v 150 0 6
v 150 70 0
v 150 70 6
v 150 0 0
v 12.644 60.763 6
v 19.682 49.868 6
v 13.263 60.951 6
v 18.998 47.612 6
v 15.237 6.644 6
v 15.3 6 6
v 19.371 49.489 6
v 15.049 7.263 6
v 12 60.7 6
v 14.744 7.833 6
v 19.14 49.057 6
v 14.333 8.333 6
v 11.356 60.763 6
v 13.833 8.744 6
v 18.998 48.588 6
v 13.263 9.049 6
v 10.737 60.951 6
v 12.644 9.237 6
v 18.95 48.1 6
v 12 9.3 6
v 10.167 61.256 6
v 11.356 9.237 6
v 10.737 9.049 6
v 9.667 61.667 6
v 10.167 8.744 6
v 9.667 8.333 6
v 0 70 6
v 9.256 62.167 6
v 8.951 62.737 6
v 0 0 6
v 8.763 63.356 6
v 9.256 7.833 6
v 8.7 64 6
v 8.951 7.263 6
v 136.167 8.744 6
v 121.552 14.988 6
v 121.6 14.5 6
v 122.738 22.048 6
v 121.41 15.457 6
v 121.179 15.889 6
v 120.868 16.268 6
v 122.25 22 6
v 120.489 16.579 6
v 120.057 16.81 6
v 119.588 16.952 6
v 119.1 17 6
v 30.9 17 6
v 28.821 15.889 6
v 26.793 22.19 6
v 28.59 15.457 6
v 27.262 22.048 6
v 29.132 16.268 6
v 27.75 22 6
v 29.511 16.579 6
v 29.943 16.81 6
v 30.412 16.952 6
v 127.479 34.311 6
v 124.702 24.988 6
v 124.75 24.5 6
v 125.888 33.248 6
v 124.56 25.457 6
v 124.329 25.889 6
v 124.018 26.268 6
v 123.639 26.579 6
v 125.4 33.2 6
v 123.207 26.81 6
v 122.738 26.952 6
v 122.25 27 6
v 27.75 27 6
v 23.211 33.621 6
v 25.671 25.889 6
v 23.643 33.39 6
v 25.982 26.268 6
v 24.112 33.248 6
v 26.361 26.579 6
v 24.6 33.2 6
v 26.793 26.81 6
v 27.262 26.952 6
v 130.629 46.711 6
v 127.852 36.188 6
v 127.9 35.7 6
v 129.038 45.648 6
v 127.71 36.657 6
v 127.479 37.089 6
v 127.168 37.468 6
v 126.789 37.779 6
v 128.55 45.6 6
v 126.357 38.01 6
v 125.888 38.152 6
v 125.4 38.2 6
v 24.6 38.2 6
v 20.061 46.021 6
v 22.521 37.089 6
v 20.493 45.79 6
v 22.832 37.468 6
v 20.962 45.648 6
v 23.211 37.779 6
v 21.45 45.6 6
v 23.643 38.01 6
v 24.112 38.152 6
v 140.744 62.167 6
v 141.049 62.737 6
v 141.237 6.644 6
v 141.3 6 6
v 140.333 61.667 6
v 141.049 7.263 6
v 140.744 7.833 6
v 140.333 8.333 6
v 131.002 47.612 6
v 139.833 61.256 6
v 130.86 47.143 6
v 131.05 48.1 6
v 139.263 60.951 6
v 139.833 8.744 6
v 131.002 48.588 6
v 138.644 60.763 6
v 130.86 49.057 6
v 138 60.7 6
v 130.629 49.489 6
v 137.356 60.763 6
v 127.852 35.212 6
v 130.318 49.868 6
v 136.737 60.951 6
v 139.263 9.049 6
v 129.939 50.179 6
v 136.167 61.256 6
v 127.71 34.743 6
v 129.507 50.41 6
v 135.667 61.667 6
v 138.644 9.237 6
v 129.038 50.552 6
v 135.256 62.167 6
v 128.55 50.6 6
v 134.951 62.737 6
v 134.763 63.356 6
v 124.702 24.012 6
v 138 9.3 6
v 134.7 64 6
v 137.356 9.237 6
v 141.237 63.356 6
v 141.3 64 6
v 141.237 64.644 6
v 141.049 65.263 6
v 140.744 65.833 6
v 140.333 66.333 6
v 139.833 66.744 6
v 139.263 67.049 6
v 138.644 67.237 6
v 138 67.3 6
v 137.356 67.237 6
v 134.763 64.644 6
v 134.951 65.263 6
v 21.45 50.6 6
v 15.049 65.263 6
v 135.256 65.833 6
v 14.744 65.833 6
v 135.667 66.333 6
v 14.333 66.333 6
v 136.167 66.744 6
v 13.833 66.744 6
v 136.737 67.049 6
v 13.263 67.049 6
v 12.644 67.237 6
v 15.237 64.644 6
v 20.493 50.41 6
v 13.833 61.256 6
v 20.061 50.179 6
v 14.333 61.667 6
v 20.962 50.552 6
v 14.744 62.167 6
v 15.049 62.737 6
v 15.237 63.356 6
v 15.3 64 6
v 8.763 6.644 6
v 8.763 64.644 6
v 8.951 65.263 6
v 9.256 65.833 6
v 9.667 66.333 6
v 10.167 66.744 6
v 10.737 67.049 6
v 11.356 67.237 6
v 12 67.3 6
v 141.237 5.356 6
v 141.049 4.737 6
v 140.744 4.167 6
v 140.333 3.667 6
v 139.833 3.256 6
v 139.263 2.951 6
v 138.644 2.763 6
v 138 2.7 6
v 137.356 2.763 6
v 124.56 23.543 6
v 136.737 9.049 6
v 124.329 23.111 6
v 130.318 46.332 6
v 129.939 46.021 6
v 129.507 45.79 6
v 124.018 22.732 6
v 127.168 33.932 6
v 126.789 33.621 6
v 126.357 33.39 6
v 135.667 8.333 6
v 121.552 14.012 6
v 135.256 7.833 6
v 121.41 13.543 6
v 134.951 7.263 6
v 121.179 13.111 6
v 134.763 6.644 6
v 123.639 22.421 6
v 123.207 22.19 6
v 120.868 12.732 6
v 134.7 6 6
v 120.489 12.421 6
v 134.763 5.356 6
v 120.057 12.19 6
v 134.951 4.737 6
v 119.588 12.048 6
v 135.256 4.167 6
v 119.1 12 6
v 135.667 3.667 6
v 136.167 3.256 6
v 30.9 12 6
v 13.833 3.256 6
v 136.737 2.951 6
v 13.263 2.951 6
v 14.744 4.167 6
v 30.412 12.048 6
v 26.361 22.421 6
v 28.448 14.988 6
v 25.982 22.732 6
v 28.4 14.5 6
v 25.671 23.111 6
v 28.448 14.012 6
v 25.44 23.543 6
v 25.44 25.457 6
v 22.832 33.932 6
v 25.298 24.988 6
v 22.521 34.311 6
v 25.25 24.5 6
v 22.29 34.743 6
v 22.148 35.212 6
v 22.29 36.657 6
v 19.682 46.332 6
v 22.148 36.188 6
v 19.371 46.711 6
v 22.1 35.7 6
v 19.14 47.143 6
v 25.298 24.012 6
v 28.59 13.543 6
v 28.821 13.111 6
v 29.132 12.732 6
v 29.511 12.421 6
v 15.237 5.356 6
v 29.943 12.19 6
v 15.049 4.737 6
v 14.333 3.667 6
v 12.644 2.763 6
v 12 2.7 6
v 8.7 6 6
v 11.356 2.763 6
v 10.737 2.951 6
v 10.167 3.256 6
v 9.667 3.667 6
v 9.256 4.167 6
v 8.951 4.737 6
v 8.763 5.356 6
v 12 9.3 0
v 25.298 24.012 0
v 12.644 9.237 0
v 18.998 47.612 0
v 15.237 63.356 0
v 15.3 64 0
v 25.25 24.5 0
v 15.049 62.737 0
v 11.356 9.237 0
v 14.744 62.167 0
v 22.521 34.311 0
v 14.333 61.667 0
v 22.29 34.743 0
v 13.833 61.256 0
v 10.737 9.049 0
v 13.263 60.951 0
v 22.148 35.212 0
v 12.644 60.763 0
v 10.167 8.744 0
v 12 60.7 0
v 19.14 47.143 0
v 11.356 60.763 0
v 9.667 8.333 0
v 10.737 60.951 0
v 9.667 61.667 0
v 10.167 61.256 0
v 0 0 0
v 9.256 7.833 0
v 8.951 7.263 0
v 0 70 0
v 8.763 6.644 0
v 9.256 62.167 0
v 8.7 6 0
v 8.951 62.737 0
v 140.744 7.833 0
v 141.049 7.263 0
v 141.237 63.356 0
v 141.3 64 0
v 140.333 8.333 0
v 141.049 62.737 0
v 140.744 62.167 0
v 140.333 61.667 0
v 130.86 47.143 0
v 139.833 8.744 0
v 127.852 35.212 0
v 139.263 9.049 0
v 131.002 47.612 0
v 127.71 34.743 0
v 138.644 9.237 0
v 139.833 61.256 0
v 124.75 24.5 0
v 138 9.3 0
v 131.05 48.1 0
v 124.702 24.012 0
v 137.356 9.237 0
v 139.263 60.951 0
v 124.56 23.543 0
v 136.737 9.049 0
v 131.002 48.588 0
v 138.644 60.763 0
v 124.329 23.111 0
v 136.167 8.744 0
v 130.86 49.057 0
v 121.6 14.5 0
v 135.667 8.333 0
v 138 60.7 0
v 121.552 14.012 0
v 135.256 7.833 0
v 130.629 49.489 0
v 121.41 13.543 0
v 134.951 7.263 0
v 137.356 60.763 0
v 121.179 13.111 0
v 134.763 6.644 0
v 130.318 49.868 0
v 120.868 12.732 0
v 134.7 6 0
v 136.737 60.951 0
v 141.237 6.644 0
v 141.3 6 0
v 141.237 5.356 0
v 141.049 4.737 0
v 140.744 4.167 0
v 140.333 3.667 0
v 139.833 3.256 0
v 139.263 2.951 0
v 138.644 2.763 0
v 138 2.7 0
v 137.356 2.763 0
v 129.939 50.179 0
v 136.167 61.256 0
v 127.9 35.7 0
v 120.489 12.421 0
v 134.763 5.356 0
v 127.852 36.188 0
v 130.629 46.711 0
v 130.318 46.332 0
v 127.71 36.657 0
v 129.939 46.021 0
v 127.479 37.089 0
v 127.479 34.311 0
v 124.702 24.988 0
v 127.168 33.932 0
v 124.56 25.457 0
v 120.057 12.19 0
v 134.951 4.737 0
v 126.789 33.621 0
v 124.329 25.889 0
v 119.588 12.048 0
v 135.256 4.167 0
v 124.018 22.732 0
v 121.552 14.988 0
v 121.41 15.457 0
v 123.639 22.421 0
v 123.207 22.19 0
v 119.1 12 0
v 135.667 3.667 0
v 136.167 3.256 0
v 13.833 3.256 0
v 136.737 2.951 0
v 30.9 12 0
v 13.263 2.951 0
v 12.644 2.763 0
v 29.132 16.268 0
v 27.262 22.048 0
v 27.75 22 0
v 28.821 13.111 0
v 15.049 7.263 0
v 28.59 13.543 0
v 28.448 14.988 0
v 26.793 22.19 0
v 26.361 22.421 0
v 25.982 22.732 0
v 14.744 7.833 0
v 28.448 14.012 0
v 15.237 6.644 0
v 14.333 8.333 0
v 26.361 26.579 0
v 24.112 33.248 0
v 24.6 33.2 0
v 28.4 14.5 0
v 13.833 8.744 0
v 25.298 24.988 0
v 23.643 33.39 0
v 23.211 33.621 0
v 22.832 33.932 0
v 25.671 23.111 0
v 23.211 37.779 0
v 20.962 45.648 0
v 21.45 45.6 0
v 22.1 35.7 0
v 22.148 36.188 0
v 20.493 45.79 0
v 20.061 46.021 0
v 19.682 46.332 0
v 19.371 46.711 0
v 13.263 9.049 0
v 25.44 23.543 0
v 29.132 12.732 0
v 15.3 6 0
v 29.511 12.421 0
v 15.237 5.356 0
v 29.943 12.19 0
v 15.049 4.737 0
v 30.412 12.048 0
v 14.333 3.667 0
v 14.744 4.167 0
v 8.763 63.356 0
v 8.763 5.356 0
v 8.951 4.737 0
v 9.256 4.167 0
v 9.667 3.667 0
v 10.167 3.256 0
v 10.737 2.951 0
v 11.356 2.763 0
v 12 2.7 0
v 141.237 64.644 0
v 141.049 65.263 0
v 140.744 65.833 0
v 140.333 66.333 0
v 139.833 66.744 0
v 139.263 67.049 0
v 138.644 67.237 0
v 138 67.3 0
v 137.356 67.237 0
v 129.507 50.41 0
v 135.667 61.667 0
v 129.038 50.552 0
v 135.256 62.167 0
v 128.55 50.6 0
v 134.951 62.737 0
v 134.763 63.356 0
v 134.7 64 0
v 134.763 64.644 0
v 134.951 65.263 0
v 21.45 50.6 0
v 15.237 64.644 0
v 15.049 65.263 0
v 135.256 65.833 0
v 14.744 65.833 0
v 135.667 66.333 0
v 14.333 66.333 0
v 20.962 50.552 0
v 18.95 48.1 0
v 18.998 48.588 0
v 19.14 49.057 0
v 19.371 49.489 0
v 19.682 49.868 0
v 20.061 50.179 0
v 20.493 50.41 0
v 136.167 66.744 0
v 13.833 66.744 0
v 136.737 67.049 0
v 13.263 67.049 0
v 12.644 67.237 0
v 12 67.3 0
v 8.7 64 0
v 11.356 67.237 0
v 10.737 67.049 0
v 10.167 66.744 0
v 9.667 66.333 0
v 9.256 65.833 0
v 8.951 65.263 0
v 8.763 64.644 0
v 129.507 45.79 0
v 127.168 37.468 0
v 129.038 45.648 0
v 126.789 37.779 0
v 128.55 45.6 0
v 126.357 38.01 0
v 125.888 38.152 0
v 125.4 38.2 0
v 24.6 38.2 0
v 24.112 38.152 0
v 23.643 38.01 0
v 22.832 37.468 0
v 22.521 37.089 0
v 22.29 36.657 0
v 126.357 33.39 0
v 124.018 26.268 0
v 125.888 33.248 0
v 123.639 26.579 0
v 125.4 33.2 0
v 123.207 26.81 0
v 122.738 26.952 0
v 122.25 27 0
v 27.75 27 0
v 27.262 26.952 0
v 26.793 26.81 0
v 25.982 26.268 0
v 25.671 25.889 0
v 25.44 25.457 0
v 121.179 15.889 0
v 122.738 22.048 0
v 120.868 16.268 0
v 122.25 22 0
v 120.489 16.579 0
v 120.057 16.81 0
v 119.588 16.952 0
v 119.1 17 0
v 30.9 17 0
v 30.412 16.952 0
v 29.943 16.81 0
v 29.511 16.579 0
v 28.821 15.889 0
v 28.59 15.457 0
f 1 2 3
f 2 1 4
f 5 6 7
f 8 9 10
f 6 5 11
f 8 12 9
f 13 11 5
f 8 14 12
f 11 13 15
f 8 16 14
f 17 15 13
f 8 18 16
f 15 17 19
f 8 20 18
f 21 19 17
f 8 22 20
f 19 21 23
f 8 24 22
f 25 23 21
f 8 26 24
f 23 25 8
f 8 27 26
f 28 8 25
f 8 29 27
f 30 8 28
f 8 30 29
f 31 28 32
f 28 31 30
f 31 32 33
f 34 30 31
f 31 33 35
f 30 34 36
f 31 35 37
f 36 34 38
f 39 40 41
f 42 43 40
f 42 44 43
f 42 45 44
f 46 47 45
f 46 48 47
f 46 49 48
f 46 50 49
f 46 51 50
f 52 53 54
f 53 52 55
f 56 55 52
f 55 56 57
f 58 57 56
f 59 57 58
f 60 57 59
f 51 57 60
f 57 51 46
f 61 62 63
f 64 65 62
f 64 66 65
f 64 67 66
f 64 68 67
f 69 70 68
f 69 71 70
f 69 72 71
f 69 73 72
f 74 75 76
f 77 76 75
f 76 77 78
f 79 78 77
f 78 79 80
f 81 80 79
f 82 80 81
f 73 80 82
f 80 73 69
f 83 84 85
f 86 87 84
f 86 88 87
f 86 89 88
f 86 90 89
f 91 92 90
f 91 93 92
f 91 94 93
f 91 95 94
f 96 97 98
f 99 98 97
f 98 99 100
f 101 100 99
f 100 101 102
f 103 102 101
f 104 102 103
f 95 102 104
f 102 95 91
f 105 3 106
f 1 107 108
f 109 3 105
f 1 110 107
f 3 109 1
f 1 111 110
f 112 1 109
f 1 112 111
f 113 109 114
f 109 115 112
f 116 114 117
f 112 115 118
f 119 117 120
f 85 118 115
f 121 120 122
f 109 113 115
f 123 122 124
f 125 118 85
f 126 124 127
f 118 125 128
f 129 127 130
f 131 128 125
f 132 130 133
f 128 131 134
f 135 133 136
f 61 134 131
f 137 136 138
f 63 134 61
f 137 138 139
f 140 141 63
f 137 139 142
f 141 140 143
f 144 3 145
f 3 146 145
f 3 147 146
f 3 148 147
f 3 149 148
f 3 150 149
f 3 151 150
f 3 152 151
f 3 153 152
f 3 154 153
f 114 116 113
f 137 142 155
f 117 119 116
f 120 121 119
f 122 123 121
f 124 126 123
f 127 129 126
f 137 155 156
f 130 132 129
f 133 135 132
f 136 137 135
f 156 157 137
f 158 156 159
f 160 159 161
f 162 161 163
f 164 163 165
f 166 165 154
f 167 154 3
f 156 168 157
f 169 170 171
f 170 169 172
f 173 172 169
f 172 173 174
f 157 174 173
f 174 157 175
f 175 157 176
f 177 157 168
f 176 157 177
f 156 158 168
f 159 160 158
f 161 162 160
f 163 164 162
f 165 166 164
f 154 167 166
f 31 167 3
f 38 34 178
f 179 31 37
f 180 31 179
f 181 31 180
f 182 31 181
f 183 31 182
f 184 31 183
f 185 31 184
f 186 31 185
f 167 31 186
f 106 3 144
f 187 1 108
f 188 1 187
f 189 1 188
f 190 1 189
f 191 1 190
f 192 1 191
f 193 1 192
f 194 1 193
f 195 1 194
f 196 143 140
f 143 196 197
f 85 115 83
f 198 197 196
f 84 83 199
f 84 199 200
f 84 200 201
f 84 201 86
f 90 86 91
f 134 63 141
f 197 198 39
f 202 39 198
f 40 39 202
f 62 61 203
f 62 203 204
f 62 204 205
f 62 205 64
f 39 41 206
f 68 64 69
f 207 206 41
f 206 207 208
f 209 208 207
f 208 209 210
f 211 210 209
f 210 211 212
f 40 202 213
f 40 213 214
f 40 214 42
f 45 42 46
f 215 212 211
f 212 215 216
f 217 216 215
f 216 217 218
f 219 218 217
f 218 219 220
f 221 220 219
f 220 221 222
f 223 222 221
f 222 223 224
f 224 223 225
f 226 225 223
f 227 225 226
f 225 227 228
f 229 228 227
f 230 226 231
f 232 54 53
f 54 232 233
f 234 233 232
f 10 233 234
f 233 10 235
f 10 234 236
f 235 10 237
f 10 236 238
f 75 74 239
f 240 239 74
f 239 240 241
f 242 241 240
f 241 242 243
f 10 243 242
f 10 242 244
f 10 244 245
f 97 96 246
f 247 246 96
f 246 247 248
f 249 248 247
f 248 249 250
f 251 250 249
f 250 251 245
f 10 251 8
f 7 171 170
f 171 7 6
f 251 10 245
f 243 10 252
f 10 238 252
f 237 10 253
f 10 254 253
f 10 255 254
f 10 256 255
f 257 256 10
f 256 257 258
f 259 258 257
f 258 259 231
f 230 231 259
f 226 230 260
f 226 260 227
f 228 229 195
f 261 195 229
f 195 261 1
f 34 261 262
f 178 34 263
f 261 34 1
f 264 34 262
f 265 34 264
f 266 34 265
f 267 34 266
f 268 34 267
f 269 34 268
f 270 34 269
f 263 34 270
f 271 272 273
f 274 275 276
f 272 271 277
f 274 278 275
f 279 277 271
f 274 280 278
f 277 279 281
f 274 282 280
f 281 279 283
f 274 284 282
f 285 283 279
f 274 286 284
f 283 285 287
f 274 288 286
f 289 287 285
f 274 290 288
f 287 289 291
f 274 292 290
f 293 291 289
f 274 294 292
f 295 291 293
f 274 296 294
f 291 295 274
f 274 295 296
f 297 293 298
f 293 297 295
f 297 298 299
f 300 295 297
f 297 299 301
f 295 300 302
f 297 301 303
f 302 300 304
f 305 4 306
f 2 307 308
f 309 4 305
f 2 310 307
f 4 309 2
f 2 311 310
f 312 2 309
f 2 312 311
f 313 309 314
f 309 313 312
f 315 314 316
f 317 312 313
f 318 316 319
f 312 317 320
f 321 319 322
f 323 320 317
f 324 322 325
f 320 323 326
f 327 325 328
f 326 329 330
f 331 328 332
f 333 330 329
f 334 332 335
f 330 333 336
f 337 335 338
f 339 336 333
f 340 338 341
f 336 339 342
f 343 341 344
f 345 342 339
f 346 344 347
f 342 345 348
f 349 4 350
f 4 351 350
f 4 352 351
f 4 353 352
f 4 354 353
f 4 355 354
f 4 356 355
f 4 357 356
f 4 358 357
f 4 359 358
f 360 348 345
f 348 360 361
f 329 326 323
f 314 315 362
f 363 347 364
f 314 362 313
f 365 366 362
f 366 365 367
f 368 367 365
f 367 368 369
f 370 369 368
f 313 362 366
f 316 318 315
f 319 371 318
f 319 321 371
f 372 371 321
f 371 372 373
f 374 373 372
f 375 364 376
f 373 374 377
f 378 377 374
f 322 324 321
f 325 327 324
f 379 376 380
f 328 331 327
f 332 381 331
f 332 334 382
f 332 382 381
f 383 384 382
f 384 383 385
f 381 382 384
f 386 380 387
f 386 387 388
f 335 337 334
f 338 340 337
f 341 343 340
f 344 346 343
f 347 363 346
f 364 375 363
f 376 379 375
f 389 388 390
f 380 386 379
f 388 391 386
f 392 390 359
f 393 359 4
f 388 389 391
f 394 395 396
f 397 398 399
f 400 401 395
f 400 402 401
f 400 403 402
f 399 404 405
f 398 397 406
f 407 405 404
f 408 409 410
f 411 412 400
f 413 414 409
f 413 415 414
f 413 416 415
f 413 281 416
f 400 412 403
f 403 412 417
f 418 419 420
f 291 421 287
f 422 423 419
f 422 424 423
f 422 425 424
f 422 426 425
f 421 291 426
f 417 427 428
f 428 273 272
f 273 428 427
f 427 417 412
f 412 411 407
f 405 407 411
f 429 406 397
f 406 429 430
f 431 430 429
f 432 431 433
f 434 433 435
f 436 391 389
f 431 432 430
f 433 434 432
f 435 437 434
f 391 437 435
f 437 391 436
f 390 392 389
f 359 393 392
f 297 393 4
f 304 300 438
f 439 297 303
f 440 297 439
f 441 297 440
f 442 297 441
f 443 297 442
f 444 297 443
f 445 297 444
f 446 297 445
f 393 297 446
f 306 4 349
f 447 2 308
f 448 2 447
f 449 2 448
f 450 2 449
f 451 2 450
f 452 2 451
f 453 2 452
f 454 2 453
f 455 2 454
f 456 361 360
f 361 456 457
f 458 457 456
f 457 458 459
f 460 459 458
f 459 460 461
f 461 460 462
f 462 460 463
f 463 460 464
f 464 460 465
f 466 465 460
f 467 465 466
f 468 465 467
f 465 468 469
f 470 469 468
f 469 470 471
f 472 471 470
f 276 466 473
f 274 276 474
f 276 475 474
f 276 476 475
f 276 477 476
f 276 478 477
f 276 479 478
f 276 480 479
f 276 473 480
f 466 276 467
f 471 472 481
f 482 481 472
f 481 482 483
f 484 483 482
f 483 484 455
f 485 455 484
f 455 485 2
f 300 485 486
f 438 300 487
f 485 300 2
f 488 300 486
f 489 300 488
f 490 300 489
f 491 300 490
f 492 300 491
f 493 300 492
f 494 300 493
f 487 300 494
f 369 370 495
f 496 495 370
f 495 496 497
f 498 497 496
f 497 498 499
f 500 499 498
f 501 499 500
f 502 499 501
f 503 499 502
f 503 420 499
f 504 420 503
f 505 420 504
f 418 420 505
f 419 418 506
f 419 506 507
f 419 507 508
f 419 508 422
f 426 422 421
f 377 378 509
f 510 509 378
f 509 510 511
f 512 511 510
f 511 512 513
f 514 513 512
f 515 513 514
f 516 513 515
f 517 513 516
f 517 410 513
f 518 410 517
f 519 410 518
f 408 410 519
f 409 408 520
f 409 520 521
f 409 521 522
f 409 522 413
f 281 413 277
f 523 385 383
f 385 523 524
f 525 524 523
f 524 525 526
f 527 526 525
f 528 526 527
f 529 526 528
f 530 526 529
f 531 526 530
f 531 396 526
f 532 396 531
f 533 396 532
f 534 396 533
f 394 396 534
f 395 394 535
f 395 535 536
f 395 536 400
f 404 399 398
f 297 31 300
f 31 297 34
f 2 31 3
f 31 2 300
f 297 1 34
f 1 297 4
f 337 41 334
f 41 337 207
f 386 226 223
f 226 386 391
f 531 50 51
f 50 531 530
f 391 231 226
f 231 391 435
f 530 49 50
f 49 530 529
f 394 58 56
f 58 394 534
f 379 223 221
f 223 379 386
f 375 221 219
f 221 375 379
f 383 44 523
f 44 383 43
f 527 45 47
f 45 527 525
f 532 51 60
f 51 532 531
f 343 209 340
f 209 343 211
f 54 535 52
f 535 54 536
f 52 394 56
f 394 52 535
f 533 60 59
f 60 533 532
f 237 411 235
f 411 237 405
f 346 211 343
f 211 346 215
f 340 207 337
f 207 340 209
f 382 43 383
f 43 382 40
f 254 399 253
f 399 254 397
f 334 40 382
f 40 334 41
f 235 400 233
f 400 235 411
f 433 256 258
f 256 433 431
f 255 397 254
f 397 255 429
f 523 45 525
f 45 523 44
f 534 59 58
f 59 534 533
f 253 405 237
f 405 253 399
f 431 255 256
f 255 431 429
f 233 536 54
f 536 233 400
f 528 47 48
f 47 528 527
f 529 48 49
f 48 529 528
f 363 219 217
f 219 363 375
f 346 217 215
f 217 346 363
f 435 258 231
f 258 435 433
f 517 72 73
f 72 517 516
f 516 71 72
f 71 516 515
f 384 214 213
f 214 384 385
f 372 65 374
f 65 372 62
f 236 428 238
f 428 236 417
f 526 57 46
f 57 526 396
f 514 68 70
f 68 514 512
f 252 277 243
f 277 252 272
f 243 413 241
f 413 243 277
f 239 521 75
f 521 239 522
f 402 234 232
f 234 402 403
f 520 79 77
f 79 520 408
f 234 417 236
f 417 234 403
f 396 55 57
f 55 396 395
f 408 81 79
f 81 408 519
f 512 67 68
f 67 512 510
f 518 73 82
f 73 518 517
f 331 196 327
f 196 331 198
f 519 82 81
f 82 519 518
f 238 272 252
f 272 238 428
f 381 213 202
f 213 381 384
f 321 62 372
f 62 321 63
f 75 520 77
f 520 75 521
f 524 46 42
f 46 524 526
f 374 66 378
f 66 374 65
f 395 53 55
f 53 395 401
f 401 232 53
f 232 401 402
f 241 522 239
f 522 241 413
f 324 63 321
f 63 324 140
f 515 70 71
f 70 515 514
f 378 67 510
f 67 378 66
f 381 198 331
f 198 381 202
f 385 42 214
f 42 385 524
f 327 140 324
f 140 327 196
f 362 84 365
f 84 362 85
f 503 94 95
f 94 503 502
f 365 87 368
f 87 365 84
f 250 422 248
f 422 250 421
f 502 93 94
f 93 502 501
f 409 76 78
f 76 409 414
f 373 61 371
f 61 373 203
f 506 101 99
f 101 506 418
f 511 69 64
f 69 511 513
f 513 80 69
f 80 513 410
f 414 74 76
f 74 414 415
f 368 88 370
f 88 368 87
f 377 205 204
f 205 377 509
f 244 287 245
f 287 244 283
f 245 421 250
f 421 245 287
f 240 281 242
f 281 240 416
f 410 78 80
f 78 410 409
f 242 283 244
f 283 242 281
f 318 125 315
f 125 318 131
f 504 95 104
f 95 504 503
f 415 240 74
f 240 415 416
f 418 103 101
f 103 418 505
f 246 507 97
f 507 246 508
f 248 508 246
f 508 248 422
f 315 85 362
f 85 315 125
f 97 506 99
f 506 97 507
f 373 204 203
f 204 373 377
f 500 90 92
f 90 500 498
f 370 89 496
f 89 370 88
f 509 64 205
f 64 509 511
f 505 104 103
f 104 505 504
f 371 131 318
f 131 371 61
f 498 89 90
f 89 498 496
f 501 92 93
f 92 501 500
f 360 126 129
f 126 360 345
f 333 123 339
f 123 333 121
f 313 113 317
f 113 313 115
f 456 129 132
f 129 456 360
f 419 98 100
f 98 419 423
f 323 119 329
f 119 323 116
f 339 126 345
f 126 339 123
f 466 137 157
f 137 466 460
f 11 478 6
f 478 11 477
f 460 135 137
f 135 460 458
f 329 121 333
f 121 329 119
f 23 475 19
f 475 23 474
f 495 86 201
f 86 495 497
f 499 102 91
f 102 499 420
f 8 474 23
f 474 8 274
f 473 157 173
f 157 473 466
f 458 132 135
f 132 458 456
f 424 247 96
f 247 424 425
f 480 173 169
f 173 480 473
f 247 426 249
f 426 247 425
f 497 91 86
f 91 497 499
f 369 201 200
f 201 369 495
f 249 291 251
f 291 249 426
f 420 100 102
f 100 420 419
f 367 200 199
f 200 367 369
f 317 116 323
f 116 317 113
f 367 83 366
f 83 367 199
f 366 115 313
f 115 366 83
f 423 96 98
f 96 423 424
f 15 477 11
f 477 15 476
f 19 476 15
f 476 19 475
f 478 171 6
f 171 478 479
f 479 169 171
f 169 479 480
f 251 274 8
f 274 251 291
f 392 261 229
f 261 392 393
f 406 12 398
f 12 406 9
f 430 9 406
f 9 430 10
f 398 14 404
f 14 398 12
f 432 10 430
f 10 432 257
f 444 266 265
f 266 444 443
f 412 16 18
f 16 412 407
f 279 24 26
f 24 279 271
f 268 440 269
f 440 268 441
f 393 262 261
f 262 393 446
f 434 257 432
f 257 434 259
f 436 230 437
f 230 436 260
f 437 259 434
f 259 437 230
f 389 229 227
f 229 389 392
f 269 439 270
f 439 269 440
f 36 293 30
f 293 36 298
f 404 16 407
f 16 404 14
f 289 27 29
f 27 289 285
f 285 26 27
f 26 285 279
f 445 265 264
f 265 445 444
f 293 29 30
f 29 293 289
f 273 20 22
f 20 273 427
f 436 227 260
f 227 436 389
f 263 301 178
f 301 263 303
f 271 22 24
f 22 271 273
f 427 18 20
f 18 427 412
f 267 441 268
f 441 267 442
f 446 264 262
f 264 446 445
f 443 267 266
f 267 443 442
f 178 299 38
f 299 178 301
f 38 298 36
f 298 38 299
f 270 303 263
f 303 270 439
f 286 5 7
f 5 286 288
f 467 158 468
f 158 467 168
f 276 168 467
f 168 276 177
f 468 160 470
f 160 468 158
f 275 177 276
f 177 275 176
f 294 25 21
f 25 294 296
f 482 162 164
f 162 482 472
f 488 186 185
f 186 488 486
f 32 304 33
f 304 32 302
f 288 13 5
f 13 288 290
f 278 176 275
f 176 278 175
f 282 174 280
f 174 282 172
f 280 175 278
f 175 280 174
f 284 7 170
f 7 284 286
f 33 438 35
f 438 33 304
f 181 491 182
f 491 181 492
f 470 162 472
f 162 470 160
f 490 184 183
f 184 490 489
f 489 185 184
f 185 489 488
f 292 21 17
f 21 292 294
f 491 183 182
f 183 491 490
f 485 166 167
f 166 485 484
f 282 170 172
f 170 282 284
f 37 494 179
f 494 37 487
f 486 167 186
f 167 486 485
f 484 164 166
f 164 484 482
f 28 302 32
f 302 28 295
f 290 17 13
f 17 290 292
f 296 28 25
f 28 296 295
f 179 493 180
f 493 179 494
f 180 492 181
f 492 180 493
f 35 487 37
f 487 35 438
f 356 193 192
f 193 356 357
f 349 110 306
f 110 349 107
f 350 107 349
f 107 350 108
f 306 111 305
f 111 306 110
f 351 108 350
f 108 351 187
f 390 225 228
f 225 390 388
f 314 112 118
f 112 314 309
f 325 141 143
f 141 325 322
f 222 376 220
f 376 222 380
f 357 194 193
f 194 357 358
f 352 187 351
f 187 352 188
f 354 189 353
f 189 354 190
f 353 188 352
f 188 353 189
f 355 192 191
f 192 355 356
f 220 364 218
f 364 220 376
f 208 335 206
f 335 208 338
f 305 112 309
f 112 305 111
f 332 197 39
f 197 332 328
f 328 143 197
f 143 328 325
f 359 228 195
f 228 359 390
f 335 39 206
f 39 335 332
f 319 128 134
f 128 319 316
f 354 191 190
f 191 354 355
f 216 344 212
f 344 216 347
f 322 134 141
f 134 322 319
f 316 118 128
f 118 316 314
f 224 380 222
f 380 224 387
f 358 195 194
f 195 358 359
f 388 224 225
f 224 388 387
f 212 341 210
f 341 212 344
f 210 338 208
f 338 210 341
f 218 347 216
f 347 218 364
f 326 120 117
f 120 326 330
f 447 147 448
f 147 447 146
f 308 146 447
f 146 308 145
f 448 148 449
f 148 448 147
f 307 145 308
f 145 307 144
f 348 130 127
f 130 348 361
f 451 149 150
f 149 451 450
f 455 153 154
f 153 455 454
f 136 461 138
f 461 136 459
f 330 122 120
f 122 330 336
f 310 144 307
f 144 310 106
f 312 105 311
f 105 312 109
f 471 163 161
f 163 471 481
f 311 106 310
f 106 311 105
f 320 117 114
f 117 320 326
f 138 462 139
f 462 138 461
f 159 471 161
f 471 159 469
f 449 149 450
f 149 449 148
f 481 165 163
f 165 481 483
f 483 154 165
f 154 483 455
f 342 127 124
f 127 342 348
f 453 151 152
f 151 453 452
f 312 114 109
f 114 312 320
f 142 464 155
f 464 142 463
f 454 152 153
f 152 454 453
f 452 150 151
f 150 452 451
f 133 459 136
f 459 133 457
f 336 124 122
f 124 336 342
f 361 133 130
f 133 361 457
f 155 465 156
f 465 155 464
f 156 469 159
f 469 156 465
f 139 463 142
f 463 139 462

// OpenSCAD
$fn = 32;

// ----------------------------------------------------------------------
// Slotted panel: 150 x 70 mm, 4 ряда of slots
// ----------------------------------------------------------------------

// --- parameters (mm) ---
panel_w = 150;            // panel width
panel_d = 70;             // panel depth
thick = 6;                // panel thickness
slot_w = 5;               // slot width
pitch0 = 10;              // first row pitch
pitch_step = 1.2;         // pitch increase per row
margin = 12;              // margin around the slot field
rows = 4;                 // number of slot rows
mount_d = 6.6;            // mounting holes
mount_x = 63;             // mounting hole offset

difference() {
  union() {
    cube([panel_w, panel_d, thick]);
  }
  /* slot rows: stadium shaped cutters, 2.5 mm clear of both faces */
  /* row 0: pitch 10, length 88.2 */
  hull() {
    translate([30.9, 14.5, -2.5]) cylinder(h = thick + 5, d = slot_w);
    translate([119.1, 14.5, -2.5]) cylinder(h = thick + 5, d = slot_w);
  }
  /* row 1: pitch 11.2, length 94.5 */
  hull() {
    translate([27.75, 24.5, -2.5]) cylinder(h = thick + 5, d = slot_w);
    translate([122.25, 24.5, -2.5]) cylinder(h = thick + 5, d = slot_w);
  }
  /* row 2: pitch 12.4, length 100.8 */
  hull() {
    translate([24.6, 35.7, -2.5]) cylinder(h = thick + 5, d = slot_w);
    translate([125.4, 35.7, -2.5]) cylinder(h = thick + 5, d = slot_w);
  }
  /* row 3: pitch 13.6, length 107.1 */
  hull() {
    translate([21.45, 48.1, -2.5]) cylinder(h = thick + 5, d = slot_w);
    translate([128.55, 48.1, -2.5]) cylinder(h = thick + 5, d = slot_w);
  }
  translate([12, 6, -2.5]) cylinder(h = 11, d = mount_d);
  translate([12, 64, -2.5]) cylinder(h = 11, d = mount_d);
  translate([138, 6, -2.5]) cylinder(h = 11, d = mount_d);
  translate([138, 64, -2.5]) cylinder(h = 11, d = mount_d);
}
